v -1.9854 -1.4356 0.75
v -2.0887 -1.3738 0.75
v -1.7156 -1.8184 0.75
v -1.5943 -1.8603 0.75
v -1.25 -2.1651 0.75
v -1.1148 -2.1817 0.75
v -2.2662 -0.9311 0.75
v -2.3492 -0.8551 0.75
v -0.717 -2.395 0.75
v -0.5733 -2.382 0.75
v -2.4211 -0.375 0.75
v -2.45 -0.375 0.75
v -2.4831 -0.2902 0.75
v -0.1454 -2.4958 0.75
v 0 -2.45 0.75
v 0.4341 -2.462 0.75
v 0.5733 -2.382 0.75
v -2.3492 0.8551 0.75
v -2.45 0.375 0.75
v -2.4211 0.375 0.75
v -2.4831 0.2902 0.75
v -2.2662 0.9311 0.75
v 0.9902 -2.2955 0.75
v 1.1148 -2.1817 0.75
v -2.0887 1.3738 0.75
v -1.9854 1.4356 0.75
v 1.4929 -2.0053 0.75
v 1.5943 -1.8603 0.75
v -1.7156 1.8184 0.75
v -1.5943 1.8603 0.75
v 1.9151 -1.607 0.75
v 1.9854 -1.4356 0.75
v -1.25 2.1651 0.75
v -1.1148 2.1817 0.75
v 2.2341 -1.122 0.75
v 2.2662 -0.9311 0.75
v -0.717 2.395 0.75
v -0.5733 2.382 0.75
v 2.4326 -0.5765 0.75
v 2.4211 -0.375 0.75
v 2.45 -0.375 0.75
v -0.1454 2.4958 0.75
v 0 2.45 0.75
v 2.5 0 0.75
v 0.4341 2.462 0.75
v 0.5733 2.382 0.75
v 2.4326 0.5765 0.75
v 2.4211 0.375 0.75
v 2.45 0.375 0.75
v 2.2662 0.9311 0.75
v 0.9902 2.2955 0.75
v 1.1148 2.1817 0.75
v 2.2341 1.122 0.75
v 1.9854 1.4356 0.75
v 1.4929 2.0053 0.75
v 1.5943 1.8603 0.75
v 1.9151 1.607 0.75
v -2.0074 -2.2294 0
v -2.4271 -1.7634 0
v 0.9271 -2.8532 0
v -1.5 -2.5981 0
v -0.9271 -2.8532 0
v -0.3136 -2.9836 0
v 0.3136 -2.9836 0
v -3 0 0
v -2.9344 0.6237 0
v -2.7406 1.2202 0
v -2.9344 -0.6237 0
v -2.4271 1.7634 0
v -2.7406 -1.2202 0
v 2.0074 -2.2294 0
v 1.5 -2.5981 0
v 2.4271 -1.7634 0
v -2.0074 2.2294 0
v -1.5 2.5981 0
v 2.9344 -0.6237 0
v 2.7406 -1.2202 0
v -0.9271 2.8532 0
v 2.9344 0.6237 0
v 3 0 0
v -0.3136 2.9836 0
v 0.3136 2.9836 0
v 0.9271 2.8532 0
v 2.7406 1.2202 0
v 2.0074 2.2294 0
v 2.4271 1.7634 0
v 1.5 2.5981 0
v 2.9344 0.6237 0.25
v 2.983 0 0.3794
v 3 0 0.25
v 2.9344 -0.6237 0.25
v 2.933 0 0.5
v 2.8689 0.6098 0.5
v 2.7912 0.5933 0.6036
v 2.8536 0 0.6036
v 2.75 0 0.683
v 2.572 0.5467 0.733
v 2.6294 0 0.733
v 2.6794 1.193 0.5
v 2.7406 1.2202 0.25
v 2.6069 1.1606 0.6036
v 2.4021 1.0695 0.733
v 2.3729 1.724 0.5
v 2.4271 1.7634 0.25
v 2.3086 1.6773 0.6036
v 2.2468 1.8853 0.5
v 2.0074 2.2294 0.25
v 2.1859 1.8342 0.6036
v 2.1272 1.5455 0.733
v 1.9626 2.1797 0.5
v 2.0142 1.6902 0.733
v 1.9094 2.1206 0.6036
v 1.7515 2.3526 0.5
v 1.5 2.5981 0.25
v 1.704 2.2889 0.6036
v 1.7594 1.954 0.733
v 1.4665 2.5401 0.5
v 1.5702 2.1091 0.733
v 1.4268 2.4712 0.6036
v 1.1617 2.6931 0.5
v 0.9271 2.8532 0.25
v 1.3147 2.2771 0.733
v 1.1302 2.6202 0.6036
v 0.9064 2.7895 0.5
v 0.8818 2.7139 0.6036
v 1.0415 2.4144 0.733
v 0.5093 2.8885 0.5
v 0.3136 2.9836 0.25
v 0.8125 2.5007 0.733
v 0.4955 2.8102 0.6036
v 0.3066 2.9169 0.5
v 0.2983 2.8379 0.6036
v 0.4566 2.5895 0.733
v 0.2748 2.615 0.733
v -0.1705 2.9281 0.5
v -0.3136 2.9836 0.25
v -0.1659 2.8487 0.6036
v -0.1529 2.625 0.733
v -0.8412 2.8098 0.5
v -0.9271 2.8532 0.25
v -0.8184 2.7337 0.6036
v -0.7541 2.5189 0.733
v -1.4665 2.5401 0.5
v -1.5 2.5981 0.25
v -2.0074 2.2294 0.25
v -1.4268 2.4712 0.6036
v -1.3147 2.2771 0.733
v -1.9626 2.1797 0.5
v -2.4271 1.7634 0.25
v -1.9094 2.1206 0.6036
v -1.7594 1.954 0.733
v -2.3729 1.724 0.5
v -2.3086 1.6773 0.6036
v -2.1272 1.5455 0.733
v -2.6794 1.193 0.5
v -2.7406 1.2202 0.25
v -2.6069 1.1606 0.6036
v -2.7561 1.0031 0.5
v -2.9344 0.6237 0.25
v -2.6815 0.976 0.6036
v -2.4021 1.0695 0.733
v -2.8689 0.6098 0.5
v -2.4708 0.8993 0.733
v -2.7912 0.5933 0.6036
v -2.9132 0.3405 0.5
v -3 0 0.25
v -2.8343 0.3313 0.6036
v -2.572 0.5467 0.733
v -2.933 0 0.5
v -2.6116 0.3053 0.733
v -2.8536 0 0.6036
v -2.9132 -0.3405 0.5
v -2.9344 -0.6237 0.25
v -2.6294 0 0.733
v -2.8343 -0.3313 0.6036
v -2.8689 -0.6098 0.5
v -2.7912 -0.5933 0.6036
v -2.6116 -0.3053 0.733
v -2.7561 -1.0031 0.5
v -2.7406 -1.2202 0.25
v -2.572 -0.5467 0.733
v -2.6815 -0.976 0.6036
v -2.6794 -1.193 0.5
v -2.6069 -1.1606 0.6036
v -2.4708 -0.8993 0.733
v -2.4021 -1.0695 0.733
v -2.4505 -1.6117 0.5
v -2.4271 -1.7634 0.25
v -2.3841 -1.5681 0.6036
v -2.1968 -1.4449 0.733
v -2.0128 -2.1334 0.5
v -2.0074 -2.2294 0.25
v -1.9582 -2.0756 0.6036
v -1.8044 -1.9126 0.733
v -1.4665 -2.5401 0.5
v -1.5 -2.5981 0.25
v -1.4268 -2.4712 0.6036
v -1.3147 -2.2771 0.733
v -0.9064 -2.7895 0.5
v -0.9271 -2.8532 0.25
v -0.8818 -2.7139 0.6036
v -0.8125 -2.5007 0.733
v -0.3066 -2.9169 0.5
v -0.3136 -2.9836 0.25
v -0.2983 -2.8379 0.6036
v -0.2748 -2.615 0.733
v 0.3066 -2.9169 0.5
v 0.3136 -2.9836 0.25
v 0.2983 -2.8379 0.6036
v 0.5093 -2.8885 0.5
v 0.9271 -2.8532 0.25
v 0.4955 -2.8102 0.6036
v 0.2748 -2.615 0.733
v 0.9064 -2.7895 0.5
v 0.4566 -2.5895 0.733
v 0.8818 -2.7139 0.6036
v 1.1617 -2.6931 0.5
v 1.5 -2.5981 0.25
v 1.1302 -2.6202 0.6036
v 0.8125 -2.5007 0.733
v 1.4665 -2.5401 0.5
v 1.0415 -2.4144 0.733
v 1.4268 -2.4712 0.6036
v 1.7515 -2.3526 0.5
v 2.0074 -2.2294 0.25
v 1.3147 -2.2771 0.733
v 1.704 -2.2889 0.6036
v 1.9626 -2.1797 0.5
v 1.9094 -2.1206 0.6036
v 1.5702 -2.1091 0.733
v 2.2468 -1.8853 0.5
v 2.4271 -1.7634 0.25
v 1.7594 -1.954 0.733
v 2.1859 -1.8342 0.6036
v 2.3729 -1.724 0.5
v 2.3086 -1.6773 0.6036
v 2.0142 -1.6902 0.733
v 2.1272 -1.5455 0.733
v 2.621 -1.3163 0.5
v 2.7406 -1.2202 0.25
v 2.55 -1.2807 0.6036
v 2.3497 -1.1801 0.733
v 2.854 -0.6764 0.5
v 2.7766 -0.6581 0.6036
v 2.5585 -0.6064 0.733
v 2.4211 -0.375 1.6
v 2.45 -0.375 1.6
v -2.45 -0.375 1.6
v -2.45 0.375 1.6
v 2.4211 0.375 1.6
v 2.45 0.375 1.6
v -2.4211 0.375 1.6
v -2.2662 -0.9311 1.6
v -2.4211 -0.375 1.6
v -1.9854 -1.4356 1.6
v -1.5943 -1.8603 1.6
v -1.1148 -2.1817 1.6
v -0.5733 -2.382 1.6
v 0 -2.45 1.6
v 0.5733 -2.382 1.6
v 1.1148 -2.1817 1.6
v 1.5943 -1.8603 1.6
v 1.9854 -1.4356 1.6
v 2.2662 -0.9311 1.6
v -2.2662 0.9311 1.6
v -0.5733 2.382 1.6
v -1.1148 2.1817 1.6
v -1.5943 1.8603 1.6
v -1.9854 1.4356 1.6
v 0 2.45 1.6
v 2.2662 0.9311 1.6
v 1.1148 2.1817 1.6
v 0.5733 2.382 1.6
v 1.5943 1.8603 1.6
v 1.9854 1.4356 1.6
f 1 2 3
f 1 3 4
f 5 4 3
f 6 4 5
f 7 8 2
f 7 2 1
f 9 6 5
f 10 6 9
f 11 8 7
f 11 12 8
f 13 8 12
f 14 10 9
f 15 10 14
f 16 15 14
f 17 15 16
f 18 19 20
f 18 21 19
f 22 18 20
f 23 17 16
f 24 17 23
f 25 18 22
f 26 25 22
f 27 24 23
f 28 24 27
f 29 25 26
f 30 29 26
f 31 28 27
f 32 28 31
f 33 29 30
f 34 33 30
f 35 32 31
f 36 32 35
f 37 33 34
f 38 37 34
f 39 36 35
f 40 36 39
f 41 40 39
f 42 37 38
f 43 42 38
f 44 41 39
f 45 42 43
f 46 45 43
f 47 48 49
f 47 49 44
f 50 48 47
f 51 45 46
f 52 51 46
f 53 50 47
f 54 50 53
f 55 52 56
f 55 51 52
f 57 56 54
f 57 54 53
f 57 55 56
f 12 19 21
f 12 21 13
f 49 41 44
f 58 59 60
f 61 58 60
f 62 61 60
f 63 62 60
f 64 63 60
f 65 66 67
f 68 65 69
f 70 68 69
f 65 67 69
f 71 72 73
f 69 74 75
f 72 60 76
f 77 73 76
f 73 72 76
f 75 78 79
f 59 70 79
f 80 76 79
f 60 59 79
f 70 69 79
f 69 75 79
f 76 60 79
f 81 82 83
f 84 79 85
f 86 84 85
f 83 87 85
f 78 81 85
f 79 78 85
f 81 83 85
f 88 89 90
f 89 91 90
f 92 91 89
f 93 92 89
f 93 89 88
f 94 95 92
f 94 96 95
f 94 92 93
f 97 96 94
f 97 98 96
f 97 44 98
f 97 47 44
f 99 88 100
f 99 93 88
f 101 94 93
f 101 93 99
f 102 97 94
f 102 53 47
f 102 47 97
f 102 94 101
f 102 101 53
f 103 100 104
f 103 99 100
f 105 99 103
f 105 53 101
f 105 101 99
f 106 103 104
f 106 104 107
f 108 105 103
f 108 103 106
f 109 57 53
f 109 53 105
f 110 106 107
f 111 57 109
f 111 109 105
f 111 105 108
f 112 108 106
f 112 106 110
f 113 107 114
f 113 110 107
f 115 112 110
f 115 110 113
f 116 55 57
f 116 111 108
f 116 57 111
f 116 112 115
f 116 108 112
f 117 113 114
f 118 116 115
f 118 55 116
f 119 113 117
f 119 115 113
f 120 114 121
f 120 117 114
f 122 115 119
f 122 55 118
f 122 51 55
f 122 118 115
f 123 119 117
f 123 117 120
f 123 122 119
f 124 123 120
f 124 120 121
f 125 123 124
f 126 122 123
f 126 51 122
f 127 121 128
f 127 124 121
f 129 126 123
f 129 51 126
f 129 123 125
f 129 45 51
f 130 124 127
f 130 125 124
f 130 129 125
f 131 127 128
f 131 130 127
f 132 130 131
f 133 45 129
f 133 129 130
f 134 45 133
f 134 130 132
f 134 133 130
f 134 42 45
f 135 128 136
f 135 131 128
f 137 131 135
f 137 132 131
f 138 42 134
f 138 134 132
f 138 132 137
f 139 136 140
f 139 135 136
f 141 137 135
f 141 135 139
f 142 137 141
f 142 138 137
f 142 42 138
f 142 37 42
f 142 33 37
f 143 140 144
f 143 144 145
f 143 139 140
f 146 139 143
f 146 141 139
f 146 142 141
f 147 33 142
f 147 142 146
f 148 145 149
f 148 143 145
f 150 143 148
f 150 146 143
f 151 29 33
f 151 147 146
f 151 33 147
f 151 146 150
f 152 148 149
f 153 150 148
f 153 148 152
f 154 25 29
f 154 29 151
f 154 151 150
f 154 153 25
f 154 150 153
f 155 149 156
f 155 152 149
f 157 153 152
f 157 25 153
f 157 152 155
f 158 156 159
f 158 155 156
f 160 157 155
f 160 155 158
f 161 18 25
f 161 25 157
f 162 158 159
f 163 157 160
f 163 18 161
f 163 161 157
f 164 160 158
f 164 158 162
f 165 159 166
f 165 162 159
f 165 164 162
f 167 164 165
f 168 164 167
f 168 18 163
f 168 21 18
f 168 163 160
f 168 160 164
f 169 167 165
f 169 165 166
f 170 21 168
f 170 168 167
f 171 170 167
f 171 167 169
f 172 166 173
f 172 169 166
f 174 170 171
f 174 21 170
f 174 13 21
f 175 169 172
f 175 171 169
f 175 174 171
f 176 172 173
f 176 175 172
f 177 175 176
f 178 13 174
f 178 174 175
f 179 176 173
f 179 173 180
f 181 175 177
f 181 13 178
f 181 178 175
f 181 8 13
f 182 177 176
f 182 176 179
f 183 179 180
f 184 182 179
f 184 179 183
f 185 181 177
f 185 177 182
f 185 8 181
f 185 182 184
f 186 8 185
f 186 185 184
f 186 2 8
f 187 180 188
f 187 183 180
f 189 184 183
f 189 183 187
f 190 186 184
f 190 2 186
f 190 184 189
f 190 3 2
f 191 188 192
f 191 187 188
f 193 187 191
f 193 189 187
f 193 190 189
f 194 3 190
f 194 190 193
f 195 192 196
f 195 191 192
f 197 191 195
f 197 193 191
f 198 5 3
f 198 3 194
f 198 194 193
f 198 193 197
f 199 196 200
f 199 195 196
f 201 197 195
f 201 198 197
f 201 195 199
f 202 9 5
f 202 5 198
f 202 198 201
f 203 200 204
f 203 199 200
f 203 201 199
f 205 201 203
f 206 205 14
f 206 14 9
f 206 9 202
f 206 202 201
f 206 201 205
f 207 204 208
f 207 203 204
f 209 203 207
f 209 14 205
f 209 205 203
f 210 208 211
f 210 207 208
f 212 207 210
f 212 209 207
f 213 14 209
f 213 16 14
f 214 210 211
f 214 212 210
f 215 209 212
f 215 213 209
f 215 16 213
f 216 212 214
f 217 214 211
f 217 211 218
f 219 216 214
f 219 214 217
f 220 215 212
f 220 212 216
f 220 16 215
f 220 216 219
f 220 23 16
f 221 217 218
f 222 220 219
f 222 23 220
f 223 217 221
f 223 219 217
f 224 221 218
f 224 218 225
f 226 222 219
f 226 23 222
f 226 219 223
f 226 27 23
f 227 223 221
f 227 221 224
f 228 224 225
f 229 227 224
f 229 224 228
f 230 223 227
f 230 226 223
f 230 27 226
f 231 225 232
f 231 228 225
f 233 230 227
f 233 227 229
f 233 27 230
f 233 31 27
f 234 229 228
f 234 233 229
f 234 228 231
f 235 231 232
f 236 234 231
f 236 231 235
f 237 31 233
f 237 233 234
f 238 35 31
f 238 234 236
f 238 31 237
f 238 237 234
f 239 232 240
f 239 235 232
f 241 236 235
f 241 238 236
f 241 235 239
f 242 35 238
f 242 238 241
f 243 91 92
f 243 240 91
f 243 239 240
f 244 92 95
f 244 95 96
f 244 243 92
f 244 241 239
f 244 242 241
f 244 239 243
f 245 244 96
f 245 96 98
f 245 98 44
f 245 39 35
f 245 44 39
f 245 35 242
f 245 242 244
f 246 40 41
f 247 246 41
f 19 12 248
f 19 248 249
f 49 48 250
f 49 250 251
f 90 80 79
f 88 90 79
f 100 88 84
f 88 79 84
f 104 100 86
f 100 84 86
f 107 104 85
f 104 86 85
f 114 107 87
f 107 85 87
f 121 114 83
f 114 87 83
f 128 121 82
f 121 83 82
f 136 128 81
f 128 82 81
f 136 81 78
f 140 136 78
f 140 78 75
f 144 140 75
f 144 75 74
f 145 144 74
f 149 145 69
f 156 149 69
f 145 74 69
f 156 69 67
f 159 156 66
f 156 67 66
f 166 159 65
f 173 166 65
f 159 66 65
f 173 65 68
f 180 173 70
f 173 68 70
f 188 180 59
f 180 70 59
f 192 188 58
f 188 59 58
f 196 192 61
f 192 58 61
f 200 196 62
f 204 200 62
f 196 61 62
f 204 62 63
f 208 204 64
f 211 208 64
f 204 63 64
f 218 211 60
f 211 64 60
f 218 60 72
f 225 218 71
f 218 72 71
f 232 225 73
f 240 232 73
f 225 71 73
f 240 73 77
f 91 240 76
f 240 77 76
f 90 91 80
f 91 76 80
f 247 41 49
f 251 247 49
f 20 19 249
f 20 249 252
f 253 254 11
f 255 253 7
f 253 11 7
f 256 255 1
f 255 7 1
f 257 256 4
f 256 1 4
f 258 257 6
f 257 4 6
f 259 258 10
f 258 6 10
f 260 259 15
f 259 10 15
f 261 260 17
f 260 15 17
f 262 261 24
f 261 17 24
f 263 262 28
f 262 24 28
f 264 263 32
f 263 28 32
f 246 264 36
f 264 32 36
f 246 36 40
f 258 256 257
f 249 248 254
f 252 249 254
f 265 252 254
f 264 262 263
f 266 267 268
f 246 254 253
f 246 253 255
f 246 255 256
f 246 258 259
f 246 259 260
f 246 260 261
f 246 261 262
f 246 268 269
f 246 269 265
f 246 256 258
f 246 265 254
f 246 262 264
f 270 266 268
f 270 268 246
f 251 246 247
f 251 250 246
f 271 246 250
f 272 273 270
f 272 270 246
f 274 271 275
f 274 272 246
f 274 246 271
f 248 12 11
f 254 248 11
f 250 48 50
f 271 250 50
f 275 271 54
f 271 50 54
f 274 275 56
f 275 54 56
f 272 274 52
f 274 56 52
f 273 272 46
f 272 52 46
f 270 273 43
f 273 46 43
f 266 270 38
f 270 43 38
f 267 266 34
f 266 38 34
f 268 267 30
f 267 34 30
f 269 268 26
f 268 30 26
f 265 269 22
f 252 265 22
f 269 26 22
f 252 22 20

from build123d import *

# Parameters (mm, degrees)
SKETCH_R     = 2.45
PAD_DEPTH    = 1.6
SKETCH001_W  = 4.9
SKETCH001_H  = 0.75
PAD001_DEPTH = 1.6
SKETCH002_R  = 3
PAD002_DEPTH = 0.75
FILLET_R     = 0.5


with BuildPart() as part:
    # Sketch → Pad (new body)
    with BuildSketch(Plane.XY):
        Circle(SKETCH_R)
    extrude(amount=PAD_DEPTH)

    # Sketch001 → Pad001 (join)
    with BuildSketch(Plane.XY):
        Rectangle(SKETCH001_W, SKETCH001_H)
    extrude(amount=PAD001_DEPTH)

    # Sketch002 → Pad002 (join)
    with BuildSketch(Plane.XY):
        Circle(SKETCH002_R)
    extrude(amount=PAD002_DEPTH)

    # Fillet
    fillet_edges = [part.edges().sort_by_distance(p)[0] for p in [
        (-3, 0, 0.75),
    ]]
    fillet(fillet_edges, radius=FILLET_R)


solid = part.part
